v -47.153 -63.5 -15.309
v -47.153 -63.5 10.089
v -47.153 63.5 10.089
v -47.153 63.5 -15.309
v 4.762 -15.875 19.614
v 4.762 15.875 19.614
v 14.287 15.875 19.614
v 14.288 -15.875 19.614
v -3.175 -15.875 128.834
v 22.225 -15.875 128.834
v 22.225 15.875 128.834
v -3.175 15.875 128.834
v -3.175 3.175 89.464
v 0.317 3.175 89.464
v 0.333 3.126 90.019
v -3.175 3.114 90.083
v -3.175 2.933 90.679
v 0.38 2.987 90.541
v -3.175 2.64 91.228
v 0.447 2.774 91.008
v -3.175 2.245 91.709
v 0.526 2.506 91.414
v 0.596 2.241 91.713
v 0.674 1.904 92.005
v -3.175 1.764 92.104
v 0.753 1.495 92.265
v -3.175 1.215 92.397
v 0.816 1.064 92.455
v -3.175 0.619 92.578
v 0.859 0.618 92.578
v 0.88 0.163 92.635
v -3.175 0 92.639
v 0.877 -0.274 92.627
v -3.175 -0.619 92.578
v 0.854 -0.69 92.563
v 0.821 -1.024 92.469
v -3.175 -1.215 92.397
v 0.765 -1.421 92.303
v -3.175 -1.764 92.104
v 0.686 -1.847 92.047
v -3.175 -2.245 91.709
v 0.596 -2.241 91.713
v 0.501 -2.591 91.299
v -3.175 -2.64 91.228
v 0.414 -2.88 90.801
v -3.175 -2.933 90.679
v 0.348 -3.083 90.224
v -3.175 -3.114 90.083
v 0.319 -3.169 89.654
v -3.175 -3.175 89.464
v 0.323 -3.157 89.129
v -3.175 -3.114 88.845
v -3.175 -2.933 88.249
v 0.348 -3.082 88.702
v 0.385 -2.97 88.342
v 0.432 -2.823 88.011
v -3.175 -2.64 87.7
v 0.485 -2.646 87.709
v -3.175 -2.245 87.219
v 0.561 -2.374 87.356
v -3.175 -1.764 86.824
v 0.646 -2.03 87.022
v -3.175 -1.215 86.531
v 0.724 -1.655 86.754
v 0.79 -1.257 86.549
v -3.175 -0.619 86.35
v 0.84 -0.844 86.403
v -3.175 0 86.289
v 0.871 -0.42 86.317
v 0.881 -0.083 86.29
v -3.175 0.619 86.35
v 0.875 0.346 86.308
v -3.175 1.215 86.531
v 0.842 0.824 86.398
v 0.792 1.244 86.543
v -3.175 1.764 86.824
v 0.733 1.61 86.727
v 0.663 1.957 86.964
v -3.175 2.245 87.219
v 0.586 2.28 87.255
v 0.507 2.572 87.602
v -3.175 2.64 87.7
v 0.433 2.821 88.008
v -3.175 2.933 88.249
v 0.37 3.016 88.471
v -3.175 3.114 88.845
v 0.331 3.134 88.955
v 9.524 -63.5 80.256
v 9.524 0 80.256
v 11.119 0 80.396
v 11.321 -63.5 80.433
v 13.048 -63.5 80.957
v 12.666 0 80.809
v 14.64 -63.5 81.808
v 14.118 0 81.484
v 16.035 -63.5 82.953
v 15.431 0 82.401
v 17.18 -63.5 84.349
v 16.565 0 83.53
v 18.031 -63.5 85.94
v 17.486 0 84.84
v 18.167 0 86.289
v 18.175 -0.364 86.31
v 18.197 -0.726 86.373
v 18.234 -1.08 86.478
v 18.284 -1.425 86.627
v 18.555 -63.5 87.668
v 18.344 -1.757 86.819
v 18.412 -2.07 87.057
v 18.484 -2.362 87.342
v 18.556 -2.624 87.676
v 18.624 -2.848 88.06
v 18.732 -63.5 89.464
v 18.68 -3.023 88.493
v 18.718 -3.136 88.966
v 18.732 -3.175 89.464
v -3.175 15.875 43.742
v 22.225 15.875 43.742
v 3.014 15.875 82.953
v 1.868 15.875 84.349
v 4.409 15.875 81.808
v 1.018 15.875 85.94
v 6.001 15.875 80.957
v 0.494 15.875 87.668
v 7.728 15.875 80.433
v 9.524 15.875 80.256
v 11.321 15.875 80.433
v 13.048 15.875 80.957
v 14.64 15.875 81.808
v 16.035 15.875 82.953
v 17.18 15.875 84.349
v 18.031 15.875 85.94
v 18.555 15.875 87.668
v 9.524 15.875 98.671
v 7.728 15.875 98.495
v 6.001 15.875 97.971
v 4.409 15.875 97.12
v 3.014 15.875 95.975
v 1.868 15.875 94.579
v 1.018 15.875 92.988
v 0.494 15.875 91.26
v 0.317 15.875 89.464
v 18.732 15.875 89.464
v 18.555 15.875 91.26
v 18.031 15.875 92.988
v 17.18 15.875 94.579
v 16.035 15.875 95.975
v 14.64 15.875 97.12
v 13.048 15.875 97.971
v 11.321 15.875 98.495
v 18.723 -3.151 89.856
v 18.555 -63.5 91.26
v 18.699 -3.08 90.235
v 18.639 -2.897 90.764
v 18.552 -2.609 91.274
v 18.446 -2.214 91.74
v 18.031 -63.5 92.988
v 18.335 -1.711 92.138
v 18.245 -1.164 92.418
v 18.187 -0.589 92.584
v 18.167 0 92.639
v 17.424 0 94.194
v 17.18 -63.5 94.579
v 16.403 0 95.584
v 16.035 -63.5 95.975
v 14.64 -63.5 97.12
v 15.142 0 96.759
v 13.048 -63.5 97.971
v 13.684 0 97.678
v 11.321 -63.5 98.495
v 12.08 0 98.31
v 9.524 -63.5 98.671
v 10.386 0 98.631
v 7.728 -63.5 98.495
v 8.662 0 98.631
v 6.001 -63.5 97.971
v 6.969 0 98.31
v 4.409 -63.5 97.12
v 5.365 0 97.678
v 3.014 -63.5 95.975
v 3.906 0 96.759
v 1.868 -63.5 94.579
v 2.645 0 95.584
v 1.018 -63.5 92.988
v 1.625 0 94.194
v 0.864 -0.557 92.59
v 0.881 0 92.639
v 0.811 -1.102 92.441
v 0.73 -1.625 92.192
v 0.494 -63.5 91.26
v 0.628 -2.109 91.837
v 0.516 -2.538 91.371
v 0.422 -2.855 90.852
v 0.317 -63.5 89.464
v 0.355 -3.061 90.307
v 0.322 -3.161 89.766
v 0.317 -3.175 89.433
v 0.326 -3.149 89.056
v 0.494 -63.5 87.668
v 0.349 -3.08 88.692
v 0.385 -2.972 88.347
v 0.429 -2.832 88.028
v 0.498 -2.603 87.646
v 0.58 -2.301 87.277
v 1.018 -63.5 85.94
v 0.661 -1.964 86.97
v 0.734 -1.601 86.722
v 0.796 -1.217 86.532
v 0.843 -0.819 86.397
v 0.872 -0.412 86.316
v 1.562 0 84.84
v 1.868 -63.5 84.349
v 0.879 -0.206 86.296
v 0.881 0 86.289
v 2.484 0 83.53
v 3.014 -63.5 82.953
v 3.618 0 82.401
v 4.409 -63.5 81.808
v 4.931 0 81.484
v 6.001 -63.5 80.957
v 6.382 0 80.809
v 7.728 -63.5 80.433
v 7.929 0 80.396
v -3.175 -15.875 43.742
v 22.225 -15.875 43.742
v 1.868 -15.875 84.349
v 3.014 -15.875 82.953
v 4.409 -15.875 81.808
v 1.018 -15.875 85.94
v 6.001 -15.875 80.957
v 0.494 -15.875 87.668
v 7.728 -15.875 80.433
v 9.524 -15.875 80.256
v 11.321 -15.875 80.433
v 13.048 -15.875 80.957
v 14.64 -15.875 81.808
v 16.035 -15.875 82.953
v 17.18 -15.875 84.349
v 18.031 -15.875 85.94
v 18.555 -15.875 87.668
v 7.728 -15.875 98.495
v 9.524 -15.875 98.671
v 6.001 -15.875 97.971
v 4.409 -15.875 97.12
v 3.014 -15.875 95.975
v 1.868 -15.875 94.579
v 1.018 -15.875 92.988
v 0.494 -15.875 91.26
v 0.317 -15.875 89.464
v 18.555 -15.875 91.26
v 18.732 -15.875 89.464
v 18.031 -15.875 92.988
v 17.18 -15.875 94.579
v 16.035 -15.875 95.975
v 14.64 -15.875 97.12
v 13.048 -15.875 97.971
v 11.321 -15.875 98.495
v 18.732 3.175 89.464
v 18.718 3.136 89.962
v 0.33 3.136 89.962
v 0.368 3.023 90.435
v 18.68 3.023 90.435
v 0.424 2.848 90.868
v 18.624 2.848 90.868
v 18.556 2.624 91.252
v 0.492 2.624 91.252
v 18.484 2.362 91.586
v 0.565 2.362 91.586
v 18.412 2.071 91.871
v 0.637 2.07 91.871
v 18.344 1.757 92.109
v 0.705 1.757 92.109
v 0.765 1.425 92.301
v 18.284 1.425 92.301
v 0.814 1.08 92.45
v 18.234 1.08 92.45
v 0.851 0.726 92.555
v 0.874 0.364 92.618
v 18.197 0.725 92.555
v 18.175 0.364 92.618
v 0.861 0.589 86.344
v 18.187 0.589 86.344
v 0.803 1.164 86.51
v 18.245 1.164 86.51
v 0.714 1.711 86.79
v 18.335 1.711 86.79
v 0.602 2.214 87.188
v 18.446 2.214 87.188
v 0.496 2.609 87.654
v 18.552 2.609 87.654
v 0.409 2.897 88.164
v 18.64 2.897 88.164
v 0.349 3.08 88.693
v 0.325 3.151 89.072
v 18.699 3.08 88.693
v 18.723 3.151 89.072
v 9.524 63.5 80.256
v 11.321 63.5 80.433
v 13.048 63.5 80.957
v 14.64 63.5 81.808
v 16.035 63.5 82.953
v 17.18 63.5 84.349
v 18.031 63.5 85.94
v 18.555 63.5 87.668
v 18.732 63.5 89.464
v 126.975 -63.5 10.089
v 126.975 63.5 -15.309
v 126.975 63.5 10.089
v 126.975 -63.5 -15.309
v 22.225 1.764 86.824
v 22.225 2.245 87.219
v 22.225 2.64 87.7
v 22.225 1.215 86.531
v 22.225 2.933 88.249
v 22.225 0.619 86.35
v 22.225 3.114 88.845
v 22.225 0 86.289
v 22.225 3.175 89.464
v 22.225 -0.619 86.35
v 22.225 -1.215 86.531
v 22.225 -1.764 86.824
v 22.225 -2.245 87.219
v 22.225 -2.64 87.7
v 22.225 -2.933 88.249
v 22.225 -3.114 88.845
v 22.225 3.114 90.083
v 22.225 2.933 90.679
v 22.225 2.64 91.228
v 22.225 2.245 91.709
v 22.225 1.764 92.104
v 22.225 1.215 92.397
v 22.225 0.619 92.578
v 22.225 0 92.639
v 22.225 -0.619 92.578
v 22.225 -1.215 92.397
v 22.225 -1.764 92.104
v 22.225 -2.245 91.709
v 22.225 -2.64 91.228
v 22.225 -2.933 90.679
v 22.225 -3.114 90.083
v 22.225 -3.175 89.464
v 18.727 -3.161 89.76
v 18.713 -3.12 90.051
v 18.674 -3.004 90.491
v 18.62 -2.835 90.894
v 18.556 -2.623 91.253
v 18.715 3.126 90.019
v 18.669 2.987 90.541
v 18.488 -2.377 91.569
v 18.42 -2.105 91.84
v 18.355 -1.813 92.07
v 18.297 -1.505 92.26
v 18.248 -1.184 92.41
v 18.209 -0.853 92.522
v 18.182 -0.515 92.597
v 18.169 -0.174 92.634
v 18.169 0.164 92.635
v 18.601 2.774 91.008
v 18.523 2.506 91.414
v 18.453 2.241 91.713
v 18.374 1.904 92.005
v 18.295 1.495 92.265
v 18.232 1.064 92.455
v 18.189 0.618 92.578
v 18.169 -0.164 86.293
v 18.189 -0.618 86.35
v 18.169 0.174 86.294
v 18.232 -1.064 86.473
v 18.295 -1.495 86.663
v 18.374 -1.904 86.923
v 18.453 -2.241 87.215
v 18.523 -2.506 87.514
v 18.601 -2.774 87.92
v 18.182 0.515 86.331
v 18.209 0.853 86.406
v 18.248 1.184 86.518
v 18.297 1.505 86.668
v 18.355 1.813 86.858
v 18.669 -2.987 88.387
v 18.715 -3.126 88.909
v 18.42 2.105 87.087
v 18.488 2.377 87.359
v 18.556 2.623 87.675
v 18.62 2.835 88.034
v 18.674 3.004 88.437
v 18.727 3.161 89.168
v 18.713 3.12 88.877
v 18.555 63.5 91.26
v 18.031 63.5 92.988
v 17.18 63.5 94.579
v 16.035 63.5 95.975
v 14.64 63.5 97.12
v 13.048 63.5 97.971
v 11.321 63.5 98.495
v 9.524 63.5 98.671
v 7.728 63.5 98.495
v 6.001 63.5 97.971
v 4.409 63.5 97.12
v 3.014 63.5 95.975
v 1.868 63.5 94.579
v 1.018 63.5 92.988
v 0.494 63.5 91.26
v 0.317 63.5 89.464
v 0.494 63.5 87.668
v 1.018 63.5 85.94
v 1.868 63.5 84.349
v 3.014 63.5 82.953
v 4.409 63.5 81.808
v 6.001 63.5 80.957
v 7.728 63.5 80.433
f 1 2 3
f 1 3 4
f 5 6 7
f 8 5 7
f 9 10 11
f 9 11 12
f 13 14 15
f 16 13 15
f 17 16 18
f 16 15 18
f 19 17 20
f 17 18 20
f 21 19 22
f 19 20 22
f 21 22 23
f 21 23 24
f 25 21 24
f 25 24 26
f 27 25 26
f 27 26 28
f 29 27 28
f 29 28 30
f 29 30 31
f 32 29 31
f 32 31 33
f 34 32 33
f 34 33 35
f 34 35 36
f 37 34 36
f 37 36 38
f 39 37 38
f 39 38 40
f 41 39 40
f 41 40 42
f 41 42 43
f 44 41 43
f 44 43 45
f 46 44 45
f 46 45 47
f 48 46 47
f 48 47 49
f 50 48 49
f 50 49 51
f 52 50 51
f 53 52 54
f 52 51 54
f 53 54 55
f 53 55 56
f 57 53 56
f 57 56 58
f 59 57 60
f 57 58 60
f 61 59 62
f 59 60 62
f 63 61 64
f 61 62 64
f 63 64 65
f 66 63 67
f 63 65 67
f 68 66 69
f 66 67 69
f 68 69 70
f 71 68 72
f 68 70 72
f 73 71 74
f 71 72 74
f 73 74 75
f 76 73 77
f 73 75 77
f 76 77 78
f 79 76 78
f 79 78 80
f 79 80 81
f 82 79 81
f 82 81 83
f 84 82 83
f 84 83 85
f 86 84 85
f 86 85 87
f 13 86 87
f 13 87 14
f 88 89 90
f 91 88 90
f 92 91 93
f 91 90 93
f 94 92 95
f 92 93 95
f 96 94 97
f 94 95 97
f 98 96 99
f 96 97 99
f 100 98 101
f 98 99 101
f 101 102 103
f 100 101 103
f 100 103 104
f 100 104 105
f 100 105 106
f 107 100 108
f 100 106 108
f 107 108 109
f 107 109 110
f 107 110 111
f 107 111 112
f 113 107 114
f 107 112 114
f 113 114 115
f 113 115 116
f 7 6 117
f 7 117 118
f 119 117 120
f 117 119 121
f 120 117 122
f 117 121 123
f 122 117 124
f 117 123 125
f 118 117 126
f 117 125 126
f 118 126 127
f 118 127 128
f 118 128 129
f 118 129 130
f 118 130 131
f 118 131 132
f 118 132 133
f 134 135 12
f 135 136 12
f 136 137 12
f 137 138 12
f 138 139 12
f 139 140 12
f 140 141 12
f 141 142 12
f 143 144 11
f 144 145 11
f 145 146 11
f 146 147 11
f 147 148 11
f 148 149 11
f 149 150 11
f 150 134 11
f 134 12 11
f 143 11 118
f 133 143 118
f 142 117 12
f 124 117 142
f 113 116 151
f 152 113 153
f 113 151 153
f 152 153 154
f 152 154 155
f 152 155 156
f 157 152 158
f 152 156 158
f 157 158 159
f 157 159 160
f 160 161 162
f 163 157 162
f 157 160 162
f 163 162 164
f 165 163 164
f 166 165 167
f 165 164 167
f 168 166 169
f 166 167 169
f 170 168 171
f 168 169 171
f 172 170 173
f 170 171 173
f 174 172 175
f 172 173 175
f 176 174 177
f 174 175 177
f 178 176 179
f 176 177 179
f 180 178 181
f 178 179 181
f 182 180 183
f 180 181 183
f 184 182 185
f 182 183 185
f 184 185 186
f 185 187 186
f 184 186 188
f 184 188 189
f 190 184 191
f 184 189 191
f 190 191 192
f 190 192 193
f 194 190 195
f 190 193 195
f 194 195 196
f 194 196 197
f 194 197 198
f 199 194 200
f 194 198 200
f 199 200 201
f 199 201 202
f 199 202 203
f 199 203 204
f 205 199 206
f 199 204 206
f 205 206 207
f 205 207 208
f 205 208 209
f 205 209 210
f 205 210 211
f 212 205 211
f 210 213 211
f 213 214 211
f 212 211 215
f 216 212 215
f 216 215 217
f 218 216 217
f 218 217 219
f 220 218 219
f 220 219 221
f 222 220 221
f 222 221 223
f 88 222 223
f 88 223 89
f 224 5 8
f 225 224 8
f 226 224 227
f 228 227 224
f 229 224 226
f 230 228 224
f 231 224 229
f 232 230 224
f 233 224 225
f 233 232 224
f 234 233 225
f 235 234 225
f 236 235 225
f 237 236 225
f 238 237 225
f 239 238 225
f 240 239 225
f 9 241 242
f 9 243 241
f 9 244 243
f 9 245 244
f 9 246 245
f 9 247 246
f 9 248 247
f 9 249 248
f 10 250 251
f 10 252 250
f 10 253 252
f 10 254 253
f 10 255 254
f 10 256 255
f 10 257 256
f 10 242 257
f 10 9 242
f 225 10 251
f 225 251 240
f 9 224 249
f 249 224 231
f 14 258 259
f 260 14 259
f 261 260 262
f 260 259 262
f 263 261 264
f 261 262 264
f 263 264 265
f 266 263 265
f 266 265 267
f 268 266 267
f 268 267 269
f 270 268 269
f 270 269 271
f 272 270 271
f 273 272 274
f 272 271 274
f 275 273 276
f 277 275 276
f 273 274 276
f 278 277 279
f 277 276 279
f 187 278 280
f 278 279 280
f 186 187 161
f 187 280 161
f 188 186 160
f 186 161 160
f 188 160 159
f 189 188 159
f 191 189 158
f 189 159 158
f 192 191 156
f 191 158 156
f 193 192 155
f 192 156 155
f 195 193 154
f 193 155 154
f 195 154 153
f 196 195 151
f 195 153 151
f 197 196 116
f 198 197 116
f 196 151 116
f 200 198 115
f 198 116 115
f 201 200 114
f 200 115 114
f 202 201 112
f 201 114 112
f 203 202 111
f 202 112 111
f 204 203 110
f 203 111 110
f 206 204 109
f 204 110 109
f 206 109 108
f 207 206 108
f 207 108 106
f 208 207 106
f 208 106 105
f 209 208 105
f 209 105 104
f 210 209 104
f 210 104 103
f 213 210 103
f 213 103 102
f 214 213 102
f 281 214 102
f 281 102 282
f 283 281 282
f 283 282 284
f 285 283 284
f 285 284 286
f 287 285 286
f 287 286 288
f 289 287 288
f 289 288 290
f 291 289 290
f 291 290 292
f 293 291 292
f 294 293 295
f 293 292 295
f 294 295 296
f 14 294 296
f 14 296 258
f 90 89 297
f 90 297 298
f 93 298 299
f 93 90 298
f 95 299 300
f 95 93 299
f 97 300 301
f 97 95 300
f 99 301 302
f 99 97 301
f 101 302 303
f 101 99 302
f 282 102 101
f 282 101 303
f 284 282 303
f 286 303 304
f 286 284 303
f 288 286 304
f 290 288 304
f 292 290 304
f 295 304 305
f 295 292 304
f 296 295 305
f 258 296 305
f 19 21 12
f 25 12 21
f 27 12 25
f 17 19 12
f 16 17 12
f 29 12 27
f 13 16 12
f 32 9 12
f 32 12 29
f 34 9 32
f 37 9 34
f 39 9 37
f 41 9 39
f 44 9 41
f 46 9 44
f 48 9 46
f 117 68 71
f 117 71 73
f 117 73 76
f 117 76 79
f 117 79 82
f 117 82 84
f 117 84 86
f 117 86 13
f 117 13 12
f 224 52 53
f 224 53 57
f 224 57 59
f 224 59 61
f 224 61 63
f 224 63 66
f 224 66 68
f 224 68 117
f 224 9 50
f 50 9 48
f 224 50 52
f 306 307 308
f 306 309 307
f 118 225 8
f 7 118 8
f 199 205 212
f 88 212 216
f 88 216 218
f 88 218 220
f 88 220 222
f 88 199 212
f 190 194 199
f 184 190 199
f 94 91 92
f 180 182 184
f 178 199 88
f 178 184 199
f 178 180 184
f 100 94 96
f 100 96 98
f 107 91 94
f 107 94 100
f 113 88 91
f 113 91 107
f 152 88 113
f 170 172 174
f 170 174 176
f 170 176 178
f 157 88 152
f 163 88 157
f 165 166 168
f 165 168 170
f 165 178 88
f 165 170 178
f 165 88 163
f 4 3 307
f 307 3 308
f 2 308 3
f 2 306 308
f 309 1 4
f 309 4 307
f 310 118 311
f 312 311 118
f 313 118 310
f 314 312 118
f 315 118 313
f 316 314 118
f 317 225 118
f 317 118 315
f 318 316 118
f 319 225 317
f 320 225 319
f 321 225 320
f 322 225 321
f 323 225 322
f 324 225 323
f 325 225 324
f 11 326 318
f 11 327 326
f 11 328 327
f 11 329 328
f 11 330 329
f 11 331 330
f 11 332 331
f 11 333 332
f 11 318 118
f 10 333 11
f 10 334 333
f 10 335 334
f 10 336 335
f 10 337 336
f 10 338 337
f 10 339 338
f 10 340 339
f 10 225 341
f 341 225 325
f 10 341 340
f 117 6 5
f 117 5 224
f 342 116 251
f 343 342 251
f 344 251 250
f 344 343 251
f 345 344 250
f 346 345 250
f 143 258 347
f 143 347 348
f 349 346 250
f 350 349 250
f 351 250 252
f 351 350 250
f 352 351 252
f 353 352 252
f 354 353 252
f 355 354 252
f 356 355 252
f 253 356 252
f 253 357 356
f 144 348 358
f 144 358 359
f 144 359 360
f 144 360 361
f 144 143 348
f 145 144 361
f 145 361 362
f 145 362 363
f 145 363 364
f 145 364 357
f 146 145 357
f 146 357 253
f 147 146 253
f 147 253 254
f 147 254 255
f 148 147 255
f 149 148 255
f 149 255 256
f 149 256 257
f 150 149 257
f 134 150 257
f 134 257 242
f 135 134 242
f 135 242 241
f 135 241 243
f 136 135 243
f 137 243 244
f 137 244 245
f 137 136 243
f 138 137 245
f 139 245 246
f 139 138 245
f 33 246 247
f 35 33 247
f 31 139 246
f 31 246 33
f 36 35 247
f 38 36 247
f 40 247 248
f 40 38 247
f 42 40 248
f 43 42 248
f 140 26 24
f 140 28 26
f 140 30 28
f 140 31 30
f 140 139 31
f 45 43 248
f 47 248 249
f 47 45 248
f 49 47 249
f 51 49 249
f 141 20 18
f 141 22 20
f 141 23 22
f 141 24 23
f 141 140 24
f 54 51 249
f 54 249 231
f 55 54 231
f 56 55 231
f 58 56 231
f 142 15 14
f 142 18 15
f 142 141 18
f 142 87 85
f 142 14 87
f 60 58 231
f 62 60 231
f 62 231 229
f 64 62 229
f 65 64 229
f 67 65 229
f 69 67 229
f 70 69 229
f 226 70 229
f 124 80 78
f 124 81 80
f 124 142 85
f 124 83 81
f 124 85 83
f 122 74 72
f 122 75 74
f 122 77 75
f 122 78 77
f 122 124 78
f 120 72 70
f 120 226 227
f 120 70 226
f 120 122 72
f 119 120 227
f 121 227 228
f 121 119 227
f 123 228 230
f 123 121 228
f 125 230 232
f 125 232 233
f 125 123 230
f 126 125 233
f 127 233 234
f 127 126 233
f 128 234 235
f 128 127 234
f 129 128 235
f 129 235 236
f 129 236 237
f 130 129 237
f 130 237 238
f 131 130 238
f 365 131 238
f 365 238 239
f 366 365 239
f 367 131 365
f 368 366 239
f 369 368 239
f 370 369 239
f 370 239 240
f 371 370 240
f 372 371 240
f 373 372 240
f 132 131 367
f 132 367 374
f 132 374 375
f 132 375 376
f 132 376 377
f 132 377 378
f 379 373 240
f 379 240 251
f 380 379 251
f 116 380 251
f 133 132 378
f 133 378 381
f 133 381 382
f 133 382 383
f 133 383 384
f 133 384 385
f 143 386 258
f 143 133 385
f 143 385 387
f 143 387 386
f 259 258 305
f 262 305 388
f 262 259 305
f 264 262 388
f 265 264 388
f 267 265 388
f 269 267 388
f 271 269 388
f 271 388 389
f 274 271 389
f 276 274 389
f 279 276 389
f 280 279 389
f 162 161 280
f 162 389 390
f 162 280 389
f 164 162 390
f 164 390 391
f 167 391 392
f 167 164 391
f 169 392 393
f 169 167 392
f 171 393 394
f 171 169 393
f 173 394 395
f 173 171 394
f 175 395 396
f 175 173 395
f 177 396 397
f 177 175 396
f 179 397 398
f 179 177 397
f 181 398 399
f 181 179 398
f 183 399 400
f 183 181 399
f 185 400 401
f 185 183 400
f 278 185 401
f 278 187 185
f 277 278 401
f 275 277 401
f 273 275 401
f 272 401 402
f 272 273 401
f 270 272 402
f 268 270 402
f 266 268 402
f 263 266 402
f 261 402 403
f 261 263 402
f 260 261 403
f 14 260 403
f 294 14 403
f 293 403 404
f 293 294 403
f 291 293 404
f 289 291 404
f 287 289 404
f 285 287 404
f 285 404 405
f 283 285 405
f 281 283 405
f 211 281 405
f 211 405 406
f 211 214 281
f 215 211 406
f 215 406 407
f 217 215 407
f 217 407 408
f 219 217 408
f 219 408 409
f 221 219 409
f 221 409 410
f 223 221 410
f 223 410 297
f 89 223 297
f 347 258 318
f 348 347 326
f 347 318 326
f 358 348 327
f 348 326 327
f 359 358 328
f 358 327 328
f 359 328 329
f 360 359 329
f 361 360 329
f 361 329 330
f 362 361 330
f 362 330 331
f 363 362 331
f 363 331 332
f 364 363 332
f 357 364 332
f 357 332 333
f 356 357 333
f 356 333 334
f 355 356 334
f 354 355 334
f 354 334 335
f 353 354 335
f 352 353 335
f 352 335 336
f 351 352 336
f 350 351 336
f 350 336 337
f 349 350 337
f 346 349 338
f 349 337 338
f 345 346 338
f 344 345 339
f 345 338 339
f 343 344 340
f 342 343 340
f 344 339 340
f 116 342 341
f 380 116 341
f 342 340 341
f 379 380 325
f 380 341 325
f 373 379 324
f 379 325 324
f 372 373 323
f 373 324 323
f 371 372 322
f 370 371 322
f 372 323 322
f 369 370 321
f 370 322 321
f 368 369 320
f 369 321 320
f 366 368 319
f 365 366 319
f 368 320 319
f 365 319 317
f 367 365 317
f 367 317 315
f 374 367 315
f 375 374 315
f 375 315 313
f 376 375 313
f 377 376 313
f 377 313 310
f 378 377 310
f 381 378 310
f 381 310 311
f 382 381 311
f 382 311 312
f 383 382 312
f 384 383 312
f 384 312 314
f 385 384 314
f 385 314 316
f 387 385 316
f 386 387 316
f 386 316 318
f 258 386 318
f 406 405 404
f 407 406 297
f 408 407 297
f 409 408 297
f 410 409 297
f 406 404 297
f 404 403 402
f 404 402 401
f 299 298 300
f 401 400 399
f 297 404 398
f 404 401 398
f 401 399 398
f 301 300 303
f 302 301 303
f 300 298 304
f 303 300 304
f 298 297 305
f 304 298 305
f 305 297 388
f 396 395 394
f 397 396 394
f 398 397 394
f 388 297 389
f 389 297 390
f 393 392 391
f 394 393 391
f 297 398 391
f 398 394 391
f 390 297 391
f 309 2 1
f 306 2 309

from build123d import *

# Parameters (mm, degrees)
F1_DEPTH = 63.5
F2_R     = 9.2075
F3_DEPTH = 15.875
F5_DEPTH = 79.376
F6_R     = 3.175
F7_DEPTH = 69.3790854702


with BuildPart() as f1:
    # F0 (on Front) → F1 (new body, symmetric)
    with BuildSketch(Plane.XZ):
        with BuildLine():
            ThreePointArc((9.5242206007, 80.2564680907), (16.0349062885, 82.9532824029), (18.7317206007, 89.4639680907))
            ThreePointArc((18.7317206007, 89.4639680907), (3.0135349129, 95.9746537785), (9.5242206007, 80.2564680907))
        make_face()
    extrude(amount=F1_DEPTH, both=True)


with BuildPart() as f1b:
    # F0 (on Front) → F1, piece 2 (new body, symmetric)
    with BuildSketch(Plane.XZ):
        Polygon((126.975029707, 10.0889680907), (9.5242206007, 10.0889680907), (-47.1530854702, 10.0889680907), (-47.1530854702, -15.3090823442), (126.975029707, -15.3090823442), align=None)
    extrude(amount=F1_DEPTH, both=True)


with BuildPart() as f3:
    # F2 (on Front) → F3 (new body, symmetric)
    with BuildSketch(Plane.XZ):
        Polygon((22.225, 19.6139680907), (22.225, 128.8339680907), (9.525, 128.8339680907), (-3.175, 128.8339680907), (-3.175, 19.6139680907), (9.525, 19.6139680907), align=None)
        with Locations((9.5242206007, 89.4639680907)):
            Circle(F2_R, mode=Mode.SUBTRACT)
    extrude(amount=F3_DEPTH, both=True)

    # F4 (on face) → F5 (cut, through all)
    with BuildSketch(Plane.XZ.offset(15.875)):
        Polygon((-3.175, 19.6139680907), (4.7625, 19.6139680907), (-3.175, 43.7418791845), align=None)
        Polygon((22.225, 43.7418791845), (14.2875, 19.6139680907), (22.225, 19.6139680907), align=None)
    extrude(amount=-F5_DEPTH, mode=Mode.SUBTRACT)


with BuildPart() as f7_tool:
    # F6 (on face) → F7 (new body, through all)
    with BuildSketch(Plane.YZ.offset(22.225)):
        with Locations((0, 89.4639680907)):
            Circle(F6_R)
    extrude(amount=-F7_DEPTH)


with BuildPart() as f1_1:
    add(f1.part)

    # F7: cut by f7_tool
    add(f7_tool.part, mode=Mode.SUBTRACT)


with BuildPart() as f3_1:
    add(f3.part)

    # F7: cut by f7_tool
    add(f7_tool.part, mode=Mode.SUBTRACT)


solid = Compound([f1b.part, f1_1.part, f3_1.part])
